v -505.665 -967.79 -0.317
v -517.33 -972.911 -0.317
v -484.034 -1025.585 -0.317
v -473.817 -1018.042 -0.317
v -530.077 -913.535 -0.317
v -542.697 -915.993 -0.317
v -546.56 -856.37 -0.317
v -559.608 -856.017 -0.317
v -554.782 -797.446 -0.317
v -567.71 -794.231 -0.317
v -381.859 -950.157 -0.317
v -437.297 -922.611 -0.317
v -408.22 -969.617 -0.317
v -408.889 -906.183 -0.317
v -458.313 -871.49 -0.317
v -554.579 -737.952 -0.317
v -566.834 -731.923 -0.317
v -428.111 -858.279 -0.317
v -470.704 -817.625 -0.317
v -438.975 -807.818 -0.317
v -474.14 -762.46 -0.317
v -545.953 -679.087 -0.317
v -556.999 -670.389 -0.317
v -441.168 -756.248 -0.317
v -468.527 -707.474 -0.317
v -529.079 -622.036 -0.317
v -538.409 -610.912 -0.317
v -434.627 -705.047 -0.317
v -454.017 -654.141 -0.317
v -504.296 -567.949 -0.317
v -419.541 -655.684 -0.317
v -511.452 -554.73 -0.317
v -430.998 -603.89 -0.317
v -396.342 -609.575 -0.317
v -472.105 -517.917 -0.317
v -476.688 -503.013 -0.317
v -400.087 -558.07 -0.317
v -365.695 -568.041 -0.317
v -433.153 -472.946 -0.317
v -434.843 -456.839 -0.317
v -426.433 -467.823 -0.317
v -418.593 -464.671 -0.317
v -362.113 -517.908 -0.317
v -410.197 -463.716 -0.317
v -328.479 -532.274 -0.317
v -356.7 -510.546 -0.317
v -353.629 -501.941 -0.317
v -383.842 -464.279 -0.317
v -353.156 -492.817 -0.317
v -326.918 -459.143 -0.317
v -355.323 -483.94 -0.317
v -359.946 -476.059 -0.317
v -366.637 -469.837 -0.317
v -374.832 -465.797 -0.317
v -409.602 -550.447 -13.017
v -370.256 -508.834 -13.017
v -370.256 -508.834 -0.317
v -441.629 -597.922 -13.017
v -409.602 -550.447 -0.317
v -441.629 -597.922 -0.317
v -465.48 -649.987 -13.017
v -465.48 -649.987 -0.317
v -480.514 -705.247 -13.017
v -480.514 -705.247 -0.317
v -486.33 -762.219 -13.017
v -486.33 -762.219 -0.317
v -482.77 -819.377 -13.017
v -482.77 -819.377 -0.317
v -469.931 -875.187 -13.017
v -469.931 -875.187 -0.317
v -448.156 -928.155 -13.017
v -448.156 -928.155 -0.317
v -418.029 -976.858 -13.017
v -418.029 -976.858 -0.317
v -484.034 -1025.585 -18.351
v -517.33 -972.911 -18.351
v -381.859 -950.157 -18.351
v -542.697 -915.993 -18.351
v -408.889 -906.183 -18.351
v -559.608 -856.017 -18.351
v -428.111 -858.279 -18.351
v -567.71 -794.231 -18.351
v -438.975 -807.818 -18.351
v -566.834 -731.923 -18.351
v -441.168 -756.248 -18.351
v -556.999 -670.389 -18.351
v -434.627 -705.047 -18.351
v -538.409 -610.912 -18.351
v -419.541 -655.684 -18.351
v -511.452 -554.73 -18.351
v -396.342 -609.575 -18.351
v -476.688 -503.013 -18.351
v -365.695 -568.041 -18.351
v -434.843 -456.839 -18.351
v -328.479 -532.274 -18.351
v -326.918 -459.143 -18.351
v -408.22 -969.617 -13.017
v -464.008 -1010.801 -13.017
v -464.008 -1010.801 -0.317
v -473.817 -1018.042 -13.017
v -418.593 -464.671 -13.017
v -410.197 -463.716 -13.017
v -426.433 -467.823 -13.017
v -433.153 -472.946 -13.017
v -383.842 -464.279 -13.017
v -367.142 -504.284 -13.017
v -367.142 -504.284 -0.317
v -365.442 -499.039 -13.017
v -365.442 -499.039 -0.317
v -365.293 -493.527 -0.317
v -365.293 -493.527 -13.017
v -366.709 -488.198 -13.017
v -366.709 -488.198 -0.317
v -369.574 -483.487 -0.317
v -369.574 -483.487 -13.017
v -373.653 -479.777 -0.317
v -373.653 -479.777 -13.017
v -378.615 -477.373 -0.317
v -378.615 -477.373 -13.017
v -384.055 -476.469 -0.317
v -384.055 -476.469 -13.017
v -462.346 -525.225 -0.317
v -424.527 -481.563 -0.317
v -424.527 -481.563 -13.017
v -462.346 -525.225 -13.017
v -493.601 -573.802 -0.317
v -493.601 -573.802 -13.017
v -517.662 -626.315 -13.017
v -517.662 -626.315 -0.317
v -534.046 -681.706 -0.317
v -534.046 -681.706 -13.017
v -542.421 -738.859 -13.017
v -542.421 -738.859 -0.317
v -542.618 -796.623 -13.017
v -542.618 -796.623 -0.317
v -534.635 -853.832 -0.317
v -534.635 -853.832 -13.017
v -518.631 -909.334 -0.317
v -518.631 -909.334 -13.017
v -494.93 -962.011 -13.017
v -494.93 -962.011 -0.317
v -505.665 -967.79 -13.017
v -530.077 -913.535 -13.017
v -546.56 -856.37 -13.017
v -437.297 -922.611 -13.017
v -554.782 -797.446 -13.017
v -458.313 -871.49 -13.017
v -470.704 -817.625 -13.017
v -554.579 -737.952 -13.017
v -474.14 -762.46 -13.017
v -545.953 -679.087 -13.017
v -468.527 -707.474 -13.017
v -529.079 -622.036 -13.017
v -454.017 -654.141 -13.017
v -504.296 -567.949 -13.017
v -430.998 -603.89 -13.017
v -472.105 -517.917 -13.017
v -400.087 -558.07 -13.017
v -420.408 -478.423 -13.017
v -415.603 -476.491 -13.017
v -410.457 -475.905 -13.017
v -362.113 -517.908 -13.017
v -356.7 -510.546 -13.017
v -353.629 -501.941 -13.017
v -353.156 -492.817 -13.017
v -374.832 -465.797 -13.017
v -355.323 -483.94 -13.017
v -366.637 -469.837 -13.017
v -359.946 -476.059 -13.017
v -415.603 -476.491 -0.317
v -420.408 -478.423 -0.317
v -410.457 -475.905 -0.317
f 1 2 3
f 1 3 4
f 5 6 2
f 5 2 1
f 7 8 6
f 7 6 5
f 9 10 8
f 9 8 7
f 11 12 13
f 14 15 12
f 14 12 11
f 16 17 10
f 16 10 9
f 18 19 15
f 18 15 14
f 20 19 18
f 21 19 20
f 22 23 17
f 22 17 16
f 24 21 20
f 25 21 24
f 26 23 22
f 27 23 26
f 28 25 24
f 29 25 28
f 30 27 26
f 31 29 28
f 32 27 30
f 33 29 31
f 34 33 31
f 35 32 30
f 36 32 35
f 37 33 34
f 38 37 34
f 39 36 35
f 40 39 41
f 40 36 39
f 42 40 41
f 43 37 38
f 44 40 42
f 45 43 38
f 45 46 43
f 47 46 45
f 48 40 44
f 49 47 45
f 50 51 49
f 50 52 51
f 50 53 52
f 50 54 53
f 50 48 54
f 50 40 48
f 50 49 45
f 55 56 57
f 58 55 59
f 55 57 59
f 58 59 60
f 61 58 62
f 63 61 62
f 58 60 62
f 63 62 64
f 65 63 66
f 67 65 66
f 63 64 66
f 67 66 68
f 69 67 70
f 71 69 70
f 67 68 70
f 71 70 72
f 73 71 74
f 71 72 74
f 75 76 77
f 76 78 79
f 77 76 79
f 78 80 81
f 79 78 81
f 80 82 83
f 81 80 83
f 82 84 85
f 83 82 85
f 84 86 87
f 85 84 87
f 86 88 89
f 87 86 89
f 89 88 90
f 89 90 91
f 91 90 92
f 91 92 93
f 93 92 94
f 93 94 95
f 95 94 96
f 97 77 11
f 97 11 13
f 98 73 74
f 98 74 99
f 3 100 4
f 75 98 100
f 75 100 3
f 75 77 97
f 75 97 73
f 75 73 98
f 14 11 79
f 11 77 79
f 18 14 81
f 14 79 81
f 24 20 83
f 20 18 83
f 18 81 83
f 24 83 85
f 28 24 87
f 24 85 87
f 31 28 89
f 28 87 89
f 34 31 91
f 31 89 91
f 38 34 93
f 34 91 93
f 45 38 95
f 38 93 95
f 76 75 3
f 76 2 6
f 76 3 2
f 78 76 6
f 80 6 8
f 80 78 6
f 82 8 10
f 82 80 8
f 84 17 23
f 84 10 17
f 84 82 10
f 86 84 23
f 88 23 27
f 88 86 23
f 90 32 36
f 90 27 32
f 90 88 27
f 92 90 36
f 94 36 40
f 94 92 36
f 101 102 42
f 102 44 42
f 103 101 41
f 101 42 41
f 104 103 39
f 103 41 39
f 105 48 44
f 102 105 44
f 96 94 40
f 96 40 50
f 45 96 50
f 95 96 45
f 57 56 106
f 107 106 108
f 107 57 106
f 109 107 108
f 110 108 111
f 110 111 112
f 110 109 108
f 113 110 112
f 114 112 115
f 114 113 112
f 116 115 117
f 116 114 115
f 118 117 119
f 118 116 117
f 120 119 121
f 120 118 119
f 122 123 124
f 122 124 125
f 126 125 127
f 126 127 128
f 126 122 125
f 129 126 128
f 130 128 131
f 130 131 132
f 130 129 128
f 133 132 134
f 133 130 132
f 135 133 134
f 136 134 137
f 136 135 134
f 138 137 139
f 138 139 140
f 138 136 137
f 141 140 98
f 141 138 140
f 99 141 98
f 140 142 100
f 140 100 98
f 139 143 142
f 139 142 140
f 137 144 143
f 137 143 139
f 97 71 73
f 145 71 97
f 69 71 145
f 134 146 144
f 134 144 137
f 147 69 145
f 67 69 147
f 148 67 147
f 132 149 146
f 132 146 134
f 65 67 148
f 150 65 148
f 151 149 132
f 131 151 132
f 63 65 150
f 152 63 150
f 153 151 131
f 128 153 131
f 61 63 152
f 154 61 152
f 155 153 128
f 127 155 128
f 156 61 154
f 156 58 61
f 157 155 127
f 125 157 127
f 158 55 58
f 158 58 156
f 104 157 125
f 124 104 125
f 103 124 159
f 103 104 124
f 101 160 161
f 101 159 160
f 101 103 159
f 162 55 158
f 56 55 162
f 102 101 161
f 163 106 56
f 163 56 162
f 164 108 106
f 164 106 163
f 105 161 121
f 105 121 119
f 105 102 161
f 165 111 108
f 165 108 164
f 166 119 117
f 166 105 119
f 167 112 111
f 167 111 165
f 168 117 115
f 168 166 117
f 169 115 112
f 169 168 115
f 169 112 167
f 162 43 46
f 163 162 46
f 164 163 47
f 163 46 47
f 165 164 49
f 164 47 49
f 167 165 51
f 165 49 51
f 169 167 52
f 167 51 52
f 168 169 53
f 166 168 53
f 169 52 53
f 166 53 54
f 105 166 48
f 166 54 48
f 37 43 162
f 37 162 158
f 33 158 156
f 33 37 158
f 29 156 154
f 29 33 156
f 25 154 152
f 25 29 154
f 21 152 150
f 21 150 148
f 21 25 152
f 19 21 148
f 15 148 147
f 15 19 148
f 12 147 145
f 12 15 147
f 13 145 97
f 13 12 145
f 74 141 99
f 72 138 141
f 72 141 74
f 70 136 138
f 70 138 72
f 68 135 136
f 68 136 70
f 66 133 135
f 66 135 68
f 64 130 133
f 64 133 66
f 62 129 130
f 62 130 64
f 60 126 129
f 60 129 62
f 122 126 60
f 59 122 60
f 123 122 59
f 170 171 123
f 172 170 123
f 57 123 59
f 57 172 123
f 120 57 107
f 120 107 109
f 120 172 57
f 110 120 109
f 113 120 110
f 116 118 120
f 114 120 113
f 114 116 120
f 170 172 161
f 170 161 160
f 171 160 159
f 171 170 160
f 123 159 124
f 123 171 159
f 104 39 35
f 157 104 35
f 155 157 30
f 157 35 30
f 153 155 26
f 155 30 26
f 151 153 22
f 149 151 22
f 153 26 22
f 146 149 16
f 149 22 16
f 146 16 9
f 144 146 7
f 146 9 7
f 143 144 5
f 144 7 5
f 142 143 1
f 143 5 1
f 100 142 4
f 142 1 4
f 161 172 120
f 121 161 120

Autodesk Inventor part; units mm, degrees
ref_plane "YZ Plane" through (0, 0, 0) normal (1, 0, 0) x (0, 1, 0)
ref_plane "XZ Plane" through (0, 0, 0) normal (0, 1, 0) x (-1, 0, 0)
ref_plane "Work Plane1" through (22.5184, 2.463, -18.3509) normal (0, 0, 1) x (0.9997722, -0.0213418, 0)
sketch "ThermoBulbBorder" plane through (22.5184, 2.463, -18.3509) normal (0, 0, 1) x (0.9997722, -0.0213418, 0)
  arc A0 (-447.455, -468.958) -> (162.145, -468.958) centre (-142.655, -774.8145) ccw
  arc A1 (-339.505, -542.1063) -> (98.645, -588.5959) centre (-142.655, -774.8145) ccw
  line L0 (-447.455, -468.958) -> (-339.505, -468.958)
  line L1 (162.145, -468.958) -> (98.645, -468.958)
  line L2 (98.645, -468.958) -> (98.645, -588.5959)
  line L3 (-383.955, -961.033) -> (-484.4967, -1038.6241)
  line L4 (98.645, -961.033) -> (199.1867, -1038.6241)
  arc A2 (-447.455, -468.958) -> (162.145, -468.958) centre (-142.655, -774.8145) ccw projected
  line L5 (98.645, -468.958) -> (98.645, -316.558) construction
  line L6 (-339.505, -468.958) -> (-339.505, -542.1063)
  line L7 (-383.955, -468.958) -> (-383.955, 914.2855) projected
  line L8 (-447.455, 914.2855) -> (-447.455, -468.958) projected
  line L9 (-383.955, -468.958) -> (-383.955, -961.033) construction
  dimension "d0" = 609.6
  dimension "d6" = 63.5
  dimension "d12" = 152.4
  dimension "d53" = 107.95
extrude "Extrusion6" add sketch "ThermoBulbBorder" along normal blind 18.034 contours L0 L6 A1 L3 A0
sketch "Sketch3" plane through (22.5184, 2.463, -0.3169) normal (0, 0, 1) x (0.9997722, -0.0213418, 0)
  arc A0 (-447.455, -468.958) -> (-484.4967, -1038.6241) centre (-142.655, -774.8145) ccw projected
  line L0 (-484.4967, -1038.6241) -> (-383.955, -961.033) projected
  arc A1 (-339.505, -542.1063) -> (-383.955, -961.033) centre (-142.655, -774.8145) ccw projected
  line L1 (-339.505, -468.958) -> (-447.455, -468.958) projected
  arc A2 (-429.1801, -468.958) -> (-435.8114, -475.308) centre (-142.655, -774.8145) ccw construction
  arc A3 (-436.6135, -493.4561) -> (-464.7905, -1023.4163) centre (-142.655, -774.8145) ccw
  line L2 (-474.4425, -1030.865) -> (-464.7905, -1023.4163)
  arc A4 (-373.4379, -528.461) -> (-409.8948, -981.0515) centre (-142.655, -774.8145) ccw
  line L3 (-142.655, -774.8145) -> (-429.1801, -468.958) construction
  line L4 (-419.5468, -988.5003) -> (-409.8948, -981.0515)
  line L5 (-396.3065, -475.308) -> (-422.6679, -475.308)
  line L6 (-422.6679, -487.5) -> (-396.2592, -487.5)
  arc A5 (-445.4213, -485.0259) -> (-474.4425, -1030.865) centre (-142.655, -774.8145) ccw
  arc A6 (-381.7732, -519.5633) -> (-396.2592, -487.5) centre (-396.2592, -506.804) ccw
  arc A7 (-373.4379, -528.461) -> (-396.3065, -475.308) centre (-396.3065, -506.804) ccw
  arc A8 (-422.6679, -487.5) -> (-436.6135, -493.4561) centre (-422.6679, -506.804) ccw
  arc A9 (-422.6679, -475.308) -> (-445.4213, -485.0259) centre (-422.6679, -506.804) ccw
  arc A10 (-381.7732, -519.5633) -> (-419.5468, -988.5003) centre (-142.655, -774.8145) ccw
  point P0 (-22.4607, -2.943)
  point P1 (-383.955, -468.958)
  point P2 (-430.7947, -487.5)
  dimension "d56" = 12.7
  dimension "d57" = 12.192
  dimension "d61" = 63.5
  dimension "d62" = 6.35
  dimension "d63" = 12.192
  dimension "d64" = 19.304
  dimension "d65" = 31.496
  dimension "d66" = 19.304
  dimension "d67" = 31.496
  dimension "d68" = 57.15
  dimension "d69" = 12.192
extrude "Extrusion7" cut sketch "Sketch3" against normal blind 12.7 contours A5 A9 L5 A7 A4 L0 A10 A6 L6 A8 A3
equation "\"d6\" = d5"
equation "\"d57\" = bRopeChannel"
equation "\"d63\" = bRopeChannel"
equation "\"d69\" = bRopeChannel"
equation "\"bRopeChannel\" = 12.192"
equation "\"d8\" = bRopeChannel"
equation "\"d9\" = bRopeChannel"
equation "\"d38\" = bRopeChannel"
equation "\"d60\" = bRopeChannel"
equation "\"d5\" = 63.5"
properties part number "HOT Thermo bulb outline L" material "Rubber, Butyl"
